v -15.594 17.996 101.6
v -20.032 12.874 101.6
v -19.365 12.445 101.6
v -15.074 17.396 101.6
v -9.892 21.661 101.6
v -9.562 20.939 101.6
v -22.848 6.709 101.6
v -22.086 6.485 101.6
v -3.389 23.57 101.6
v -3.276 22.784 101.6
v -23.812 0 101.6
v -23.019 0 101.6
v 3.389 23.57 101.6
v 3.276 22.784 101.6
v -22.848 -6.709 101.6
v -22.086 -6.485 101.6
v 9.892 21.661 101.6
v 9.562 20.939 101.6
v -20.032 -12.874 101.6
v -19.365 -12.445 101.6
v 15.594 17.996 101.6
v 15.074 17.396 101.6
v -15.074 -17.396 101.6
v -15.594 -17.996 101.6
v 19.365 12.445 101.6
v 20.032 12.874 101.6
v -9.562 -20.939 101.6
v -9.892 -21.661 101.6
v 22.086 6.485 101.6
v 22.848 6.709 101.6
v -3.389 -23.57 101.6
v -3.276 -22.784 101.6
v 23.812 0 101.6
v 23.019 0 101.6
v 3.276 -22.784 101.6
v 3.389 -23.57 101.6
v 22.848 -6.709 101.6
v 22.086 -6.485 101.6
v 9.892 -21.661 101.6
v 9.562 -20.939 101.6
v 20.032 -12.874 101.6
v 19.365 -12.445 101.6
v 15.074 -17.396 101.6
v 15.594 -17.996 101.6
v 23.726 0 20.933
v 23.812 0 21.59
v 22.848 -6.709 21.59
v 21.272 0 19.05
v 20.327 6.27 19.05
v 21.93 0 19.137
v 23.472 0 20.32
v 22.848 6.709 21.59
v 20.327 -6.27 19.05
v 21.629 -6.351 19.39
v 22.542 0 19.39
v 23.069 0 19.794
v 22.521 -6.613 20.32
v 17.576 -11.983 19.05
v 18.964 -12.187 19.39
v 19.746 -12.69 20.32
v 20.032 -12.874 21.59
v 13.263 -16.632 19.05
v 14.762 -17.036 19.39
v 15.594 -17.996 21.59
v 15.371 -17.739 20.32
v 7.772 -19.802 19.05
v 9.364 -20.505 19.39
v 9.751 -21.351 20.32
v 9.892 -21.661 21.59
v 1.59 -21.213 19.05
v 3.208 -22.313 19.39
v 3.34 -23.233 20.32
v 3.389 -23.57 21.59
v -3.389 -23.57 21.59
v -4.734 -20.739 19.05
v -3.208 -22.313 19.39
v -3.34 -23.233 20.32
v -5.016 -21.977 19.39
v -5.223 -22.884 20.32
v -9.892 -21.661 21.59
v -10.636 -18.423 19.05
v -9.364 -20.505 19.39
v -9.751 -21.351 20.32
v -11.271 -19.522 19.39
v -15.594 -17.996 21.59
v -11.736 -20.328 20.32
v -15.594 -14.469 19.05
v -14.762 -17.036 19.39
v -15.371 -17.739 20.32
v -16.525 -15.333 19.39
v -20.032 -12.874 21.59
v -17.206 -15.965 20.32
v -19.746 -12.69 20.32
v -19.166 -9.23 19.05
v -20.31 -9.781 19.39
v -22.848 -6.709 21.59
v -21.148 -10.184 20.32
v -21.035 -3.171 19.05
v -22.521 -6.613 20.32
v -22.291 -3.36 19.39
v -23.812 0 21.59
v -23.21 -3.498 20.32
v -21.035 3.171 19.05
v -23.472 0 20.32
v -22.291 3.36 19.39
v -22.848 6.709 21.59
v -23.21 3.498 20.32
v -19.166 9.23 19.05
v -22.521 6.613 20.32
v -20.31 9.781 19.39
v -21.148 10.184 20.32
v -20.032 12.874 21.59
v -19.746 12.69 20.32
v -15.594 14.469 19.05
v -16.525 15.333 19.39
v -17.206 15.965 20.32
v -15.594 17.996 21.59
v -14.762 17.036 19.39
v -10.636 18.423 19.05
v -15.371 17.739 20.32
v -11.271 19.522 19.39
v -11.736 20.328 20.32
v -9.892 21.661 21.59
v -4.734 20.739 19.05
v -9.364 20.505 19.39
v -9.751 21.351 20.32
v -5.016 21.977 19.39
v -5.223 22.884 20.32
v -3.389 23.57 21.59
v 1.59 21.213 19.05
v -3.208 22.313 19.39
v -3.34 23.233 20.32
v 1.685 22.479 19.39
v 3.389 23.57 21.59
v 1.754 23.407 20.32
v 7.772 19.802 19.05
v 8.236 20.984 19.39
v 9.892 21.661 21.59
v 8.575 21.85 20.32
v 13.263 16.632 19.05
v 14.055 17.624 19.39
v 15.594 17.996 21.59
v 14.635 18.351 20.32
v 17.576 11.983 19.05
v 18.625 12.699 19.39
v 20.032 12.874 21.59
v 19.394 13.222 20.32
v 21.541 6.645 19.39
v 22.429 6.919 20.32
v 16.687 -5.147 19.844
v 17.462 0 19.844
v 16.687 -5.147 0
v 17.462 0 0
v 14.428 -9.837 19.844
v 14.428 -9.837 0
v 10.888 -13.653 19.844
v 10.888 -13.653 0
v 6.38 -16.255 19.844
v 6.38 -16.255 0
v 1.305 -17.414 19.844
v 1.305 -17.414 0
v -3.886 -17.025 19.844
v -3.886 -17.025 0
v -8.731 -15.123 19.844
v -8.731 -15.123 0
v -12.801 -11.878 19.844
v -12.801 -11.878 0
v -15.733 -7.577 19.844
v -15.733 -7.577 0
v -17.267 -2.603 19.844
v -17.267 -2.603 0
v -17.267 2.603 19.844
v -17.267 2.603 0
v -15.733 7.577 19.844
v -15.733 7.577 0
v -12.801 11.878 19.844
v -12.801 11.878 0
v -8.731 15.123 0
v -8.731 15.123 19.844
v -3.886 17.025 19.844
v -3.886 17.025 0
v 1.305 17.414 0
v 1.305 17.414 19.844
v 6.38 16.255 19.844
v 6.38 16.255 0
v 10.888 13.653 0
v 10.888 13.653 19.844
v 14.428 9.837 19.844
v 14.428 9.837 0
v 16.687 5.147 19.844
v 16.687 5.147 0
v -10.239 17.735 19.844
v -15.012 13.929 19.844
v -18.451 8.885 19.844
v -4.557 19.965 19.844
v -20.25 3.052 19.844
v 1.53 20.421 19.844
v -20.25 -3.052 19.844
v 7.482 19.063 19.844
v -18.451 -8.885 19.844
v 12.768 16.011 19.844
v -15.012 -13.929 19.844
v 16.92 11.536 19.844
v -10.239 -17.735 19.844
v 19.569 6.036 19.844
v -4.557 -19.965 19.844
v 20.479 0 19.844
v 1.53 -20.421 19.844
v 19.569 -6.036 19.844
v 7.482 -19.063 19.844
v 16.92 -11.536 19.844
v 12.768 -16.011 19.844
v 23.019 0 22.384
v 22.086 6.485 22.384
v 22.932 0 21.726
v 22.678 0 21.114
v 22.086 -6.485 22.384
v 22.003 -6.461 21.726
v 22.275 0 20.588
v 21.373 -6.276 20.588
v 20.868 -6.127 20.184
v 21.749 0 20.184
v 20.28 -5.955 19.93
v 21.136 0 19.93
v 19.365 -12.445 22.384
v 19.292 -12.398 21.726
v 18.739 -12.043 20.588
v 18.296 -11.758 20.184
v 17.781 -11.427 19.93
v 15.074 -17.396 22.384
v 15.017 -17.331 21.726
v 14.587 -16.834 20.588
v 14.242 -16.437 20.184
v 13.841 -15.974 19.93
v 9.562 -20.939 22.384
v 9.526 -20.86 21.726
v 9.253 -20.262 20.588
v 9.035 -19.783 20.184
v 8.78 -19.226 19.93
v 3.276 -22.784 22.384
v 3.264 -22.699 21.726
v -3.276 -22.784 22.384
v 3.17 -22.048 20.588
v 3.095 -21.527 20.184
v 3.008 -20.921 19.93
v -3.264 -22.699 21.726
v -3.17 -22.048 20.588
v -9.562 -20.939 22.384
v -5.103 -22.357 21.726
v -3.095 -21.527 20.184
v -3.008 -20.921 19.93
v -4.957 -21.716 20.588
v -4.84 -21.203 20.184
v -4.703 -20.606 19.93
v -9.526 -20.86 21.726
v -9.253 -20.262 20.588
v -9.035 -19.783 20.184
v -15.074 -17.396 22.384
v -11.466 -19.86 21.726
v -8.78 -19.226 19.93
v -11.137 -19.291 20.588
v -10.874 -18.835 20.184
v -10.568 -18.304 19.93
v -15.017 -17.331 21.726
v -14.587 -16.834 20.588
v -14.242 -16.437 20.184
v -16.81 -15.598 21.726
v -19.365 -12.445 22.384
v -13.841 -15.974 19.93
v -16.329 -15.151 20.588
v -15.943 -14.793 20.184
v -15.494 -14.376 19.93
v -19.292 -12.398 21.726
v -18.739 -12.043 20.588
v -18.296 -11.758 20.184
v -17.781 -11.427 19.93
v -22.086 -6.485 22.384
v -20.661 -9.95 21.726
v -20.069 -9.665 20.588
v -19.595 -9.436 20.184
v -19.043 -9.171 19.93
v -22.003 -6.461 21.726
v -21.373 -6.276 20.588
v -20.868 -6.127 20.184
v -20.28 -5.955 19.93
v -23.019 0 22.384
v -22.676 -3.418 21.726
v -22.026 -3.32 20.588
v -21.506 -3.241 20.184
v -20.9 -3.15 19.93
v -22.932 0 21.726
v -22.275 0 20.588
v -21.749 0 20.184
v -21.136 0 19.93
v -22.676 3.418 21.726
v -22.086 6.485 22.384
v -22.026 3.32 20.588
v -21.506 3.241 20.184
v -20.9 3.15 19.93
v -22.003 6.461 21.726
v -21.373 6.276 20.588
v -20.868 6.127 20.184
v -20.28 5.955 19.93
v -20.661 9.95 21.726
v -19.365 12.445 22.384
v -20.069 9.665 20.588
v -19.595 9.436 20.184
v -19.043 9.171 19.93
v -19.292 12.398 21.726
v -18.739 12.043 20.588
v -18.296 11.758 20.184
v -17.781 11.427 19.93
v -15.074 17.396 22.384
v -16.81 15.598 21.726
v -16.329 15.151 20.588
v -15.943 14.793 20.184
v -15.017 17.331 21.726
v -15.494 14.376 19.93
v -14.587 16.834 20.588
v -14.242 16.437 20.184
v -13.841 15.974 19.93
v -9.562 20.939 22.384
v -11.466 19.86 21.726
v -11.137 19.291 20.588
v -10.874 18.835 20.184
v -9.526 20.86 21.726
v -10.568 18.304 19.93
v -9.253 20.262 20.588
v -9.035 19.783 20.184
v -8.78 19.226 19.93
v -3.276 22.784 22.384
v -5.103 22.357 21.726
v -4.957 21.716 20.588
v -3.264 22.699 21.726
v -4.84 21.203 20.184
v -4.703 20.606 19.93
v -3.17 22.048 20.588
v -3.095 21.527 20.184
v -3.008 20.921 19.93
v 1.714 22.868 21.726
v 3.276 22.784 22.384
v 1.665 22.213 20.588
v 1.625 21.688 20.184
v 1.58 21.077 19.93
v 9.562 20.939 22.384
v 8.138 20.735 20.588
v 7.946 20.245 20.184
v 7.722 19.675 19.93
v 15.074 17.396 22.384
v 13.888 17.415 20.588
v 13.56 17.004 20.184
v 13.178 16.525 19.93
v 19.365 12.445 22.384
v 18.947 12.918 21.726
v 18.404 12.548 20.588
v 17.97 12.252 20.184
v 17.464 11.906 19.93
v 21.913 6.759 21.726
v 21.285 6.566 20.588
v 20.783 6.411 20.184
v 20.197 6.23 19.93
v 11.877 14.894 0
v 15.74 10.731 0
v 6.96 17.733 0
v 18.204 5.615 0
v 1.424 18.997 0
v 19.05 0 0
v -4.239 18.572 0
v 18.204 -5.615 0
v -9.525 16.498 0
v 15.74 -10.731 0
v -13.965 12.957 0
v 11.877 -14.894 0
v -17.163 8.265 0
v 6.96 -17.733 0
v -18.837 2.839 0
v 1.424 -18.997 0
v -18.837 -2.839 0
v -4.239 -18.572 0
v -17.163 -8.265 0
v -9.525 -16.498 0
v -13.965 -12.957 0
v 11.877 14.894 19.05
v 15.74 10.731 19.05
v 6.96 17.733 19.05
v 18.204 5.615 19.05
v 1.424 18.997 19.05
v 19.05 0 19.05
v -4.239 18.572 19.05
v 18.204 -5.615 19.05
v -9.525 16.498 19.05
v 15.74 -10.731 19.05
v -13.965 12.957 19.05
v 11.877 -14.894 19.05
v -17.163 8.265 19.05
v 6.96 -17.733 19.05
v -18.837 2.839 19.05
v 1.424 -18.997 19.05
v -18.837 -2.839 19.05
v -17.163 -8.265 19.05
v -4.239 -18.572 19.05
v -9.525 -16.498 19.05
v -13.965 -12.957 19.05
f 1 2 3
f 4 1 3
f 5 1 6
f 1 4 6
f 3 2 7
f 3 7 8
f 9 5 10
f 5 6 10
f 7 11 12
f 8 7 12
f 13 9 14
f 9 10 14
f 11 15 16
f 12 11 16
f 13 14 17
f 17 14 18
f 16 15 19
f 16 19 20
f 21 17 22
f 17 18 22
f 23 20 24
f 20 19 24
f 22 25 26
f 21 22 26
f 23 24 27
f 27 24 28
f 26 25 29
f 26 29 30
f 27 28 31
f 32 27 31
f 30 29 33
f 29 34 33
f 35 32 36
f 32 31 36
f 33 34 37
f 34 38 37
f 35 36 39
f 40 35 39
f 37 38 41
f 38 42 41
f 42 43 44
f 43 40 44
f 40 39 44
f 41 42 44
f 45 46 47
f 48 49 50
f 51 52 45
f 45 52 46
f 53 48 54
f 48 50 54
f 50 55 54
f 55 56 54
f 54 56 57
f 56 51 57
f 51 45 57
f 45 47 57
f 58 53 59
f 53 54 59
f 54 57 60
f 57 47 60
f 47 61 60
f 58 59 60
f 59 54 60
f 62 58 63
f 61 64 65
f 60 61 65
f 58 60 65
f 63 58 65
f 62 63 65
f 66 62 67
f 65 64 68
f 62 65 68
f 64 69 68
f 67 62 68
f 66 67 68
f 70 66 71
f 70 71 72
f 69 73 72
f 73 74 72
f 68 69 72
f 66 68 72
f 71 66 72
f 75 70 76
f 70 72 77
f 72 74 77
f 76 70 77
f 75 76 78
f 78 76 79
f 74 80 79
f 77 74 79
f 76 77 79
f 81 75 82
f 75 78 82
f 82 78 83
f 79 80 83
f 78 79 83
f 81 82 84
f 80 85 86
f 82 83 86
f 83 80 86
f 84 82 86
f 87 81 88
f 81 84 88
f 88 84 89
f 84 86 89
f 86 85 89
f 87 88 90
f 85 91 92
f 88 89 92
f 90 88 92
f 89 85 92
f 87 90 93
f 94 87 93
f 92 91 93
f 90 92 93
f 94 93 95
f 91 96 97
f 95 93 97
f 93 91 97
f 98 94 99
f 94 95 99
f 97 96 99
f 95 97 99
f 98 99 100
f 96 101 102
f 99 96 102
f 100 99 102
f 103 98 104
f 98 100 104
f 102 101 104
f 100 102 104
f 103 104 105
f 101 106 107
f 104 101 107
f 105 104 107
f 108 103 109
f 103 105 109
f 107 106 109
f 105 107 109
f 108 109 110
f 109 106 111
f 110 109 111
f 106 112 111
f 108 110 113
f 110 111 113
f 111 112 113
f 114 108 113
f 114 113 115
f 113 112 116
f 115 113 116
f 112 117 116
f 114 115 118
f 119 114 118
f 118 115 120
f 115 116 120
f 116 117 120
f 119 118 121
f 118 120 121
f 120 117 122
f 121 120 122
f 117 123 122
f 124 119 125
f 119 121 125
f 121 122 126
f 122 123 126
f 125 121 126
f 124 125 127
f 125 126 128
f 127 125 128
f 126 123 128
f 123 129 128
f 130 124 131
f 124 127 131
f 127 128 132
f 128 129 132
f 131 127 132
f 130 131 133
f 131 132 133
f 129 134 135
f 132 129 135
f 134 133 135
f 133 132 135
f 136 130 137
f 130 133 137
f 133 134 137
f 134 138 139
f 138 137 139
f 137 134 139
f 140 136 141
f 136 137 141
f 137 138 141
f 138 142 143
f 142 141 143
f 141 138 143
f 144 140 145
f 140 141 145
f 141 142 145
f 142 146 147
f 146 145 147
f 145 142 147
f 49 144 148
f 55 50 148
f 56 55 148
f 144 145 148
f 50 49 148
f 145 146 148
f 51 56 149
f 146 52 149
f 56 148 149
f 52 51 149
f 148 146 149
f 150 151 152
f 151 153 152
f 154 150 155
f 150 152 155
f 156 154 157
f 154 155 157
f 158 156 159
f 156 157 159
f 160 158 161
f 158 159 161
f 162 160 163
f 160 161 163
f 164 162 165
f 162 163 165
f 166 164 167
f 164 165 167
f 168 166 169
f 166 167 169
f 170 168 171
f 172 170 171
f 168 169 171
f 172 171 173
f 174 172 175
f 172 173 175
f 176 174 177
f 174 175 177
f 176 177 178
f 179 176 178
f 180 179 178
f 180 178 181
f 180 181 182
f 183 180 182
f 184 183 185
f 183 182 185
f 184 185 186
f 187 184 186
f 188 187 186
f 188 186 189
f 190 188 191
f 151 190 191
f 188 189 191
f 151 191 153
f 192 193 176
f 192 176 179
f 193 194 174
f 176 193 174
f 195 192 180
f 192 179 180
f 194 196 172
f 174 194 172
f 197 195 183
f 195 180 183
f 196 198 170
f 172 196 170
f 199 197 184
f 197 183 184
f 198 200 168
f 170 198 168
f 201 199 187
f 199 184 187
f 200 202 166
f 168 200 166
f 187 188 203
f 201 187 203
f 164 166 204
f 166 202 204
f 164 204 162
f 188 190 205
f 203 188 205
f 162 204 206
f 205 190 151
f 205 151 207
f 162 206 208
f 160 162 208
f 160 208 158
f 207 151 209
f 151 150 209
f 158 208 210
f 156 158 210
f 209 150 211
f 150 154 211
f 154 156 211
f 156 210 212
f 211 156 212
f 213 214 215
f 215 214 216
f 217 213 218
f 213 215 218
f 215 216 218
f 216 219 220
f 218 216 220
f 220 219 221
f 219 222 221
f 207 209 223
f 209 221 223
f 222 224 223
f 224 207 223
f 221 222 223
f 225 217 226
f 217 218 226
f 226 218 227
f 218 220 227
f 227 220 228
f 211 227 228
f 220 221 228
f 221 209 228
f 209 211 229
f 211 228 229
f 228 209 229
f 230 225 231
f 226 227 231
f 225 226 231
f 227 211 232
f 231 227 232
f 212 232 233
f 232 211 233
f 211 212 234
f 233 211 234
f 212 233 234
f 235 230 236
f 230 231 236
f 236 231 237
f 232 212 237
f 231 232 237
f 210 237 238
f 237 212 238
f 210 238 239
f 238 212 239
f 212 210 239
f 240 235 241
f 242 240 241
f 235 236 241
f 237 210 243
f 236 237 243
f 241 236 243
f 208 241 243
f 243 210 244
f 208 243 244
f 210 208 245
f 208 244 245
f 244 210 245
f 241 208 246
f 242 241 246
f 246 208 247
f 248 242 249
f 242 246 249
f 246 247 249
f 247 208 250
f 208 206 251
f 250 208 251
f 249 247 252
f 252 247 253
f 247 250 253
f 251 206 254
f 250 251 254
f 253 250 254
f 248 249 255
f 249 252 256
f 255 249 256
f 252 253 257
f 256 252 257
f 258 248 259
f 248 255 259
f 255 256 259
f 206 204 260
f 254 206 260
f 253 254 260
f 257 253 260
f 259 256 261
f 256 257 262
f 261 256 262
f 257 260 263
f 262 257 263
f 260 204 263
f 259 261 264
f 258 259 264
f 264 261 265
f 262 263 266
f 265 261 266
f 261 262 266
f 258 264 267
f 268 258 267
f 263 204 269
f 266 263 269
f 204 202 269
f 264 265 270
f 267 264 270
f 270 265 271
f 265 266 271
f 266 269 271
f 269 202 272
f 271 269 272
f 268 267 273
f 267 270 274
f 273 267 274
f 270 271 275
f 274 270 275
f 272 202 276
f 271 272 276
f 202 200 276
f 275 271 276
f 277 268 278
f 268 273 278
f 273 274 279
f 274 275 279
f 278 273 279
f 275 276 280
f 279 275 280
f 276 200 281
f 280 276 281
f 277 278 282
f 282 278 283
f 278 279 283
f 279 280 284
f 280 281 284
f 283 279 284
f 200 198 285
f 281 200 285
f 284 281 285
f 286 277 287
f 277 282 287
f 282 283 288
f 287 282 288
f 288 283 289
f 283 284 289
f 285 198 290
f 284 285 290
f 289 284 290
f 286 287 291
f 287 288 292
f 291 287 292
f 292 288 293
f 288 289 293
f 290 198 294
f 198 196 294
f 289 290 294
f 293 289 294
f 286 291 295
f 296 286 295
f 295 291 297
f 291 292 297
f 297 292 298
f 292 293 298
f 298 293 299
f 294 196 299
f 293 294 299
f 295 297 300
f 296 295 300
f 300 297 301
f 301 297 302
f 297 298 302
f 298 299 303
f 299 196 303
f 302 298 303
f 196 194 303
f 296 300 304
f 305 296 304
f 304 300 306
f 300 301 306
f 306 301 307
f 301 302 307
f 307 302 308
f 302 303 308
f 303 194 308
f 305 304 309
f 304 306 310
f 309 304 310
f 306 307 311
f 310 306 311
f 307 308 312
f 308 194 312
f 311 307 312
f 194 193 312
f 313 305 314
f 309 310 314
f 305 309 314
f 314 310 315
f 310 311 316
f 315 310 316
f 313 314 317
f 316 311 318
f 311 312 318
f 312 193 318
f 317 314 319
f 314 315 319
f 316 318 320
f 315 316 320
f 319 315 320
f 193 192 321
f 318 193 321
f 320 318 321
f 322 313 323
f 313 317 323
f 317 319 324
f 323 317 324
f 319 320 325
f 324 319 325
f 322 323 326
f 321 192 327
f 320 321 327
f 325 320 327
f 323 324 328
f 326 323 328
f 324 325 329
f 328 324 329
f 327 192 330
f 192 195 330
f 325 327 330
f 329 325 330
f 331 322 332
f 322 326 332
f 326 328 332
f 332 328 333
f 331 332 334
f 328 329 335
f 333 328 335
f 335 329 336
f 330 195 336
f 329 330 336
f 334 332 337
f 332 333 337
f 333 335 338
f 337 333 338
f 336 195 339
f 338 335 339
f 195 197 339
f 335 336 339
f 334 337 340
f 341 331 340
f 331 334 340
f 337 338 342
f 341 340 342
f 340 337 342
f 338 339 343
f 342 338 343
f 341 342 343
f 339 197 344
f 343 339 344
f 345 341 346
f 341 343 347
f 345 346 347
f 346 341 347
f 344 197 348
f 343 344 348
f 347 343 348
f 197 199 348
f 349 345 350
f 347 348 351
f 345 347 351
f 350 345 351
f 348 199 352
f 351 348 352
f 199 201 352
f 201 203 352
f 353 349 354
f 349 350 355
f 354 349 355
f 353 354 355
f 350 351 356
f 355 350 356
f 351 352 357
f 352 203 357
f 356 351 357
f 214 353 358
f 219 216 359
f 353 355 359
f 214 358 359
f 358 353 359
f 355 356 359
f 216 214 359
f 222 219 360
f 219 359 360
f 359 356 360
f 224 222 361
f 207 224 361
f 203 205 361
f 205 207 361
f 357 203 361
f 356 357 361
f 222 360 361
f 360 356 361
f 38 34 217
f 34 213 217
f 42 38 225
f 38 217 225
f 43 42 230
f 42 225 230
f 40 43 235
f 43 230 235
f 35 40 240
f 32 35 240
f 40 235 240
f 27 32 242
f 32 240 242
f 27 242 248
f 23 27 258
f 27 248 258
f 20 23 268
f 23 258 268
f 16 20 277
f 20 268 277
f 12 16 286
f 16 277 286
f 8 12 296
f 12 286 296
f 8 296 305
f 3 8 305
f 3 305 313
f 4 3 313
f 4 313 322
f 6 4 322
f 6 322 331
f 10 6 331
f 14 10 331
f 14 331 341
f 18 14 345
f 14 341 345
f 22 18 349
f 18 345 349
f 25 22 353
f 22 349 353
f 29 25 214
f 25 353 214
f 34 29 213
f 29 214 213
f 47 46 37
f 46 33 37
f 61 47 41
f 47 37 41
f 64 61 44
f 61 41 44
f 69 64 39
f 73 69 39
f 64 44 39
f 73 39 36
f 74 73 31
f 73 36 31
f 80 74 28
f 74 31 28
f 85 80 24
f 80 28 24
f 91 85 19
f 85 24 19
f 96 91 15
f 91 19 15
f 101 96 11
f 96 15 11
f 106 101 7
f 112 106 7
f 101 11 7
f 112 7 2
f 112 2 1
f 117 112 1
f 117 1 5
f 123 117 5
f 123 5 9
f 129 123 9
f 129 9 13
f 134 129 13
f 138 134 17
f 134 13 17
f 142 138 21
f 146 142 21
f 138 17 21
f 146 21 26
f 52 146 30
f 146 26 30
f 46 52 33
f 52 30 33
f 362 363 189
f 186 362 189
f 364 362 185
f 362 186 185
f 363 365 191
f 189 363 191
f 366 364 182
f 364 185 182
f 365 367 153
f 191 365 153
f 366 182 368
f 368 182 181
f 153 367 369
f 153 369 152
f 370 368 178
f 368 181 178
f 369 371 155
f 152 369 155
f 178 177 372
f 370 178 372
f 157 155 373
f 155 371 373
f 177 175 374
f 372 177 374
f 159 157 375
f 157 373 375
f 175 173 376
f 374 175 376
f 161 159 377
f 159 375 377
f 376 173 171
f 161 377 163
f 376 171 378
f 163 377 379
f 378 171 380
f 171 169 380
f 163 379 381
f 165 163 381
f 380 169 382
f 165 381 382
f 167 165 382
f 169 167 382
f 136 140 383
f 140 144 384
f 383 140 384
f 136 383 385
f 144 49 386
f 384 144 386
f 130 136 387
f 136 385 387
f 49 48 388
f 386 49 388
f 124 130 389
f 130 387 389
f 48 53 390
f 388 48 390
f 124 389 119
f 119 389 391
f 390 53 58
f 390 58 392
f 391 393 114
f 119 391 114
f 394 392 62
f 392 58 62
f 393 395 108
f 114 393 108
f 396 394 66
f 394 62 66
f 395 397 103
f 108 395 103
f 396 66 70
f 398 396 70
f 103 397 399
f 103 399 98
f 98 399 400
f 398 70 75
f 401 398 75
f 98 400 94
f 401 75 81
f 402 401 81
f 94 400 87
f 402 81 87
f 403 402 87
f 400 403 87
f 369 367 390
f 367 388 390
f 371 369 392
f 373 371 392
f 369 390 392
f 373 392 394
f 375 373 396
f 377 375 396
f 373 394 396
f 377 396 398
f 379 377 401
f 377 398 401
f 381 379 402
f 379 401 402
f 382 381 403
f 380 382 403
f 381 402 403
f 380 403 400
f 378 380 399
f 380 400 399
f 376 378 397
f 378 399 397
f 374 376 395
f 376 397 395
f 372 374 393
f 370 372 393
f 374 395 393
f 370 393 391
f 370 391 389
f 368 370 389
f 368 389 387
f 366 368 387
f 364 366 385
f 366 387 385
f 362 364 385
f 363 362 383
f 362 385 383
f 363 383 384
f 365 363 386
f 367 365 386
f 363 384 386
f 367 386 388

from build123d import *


with BuildPart() as f1:
    # F0 (on Front) → F1 (revolve)
    with BuildSketch(Plane.XZ):
        with BuildLine():
            Line((17.4625, 0), (19.05, 0))
            Line((19.05, 0), (19.05, 19.05))
            Line((19.05, 19.05), (21.2725, 19.05))
            ThreePointArc((21.2725, 19.05), (23.068551, 19.793949), (23.8125, 21.59))
            Line((23.8125, 21.59), (23.8125, 101.6))
            Line((23.8125, 101.6), (23.01875, 101.6))
            Line((23.01875, 101.6), (23.01875, 22.38375))
            ThreePointArc((23.01875, 22.38375), (22.274801, 20.587699), (20.47875, 19.84375))
            Line((20.47875, 19.84375), (17.4625, 19.84375))
            Line((17.4625, 19.84375), (17.4625, 0))
        make_face()
    revolve(axis=Axis((0, 0, 3.679249), (0, 0, -1)))


solid = f1.part
